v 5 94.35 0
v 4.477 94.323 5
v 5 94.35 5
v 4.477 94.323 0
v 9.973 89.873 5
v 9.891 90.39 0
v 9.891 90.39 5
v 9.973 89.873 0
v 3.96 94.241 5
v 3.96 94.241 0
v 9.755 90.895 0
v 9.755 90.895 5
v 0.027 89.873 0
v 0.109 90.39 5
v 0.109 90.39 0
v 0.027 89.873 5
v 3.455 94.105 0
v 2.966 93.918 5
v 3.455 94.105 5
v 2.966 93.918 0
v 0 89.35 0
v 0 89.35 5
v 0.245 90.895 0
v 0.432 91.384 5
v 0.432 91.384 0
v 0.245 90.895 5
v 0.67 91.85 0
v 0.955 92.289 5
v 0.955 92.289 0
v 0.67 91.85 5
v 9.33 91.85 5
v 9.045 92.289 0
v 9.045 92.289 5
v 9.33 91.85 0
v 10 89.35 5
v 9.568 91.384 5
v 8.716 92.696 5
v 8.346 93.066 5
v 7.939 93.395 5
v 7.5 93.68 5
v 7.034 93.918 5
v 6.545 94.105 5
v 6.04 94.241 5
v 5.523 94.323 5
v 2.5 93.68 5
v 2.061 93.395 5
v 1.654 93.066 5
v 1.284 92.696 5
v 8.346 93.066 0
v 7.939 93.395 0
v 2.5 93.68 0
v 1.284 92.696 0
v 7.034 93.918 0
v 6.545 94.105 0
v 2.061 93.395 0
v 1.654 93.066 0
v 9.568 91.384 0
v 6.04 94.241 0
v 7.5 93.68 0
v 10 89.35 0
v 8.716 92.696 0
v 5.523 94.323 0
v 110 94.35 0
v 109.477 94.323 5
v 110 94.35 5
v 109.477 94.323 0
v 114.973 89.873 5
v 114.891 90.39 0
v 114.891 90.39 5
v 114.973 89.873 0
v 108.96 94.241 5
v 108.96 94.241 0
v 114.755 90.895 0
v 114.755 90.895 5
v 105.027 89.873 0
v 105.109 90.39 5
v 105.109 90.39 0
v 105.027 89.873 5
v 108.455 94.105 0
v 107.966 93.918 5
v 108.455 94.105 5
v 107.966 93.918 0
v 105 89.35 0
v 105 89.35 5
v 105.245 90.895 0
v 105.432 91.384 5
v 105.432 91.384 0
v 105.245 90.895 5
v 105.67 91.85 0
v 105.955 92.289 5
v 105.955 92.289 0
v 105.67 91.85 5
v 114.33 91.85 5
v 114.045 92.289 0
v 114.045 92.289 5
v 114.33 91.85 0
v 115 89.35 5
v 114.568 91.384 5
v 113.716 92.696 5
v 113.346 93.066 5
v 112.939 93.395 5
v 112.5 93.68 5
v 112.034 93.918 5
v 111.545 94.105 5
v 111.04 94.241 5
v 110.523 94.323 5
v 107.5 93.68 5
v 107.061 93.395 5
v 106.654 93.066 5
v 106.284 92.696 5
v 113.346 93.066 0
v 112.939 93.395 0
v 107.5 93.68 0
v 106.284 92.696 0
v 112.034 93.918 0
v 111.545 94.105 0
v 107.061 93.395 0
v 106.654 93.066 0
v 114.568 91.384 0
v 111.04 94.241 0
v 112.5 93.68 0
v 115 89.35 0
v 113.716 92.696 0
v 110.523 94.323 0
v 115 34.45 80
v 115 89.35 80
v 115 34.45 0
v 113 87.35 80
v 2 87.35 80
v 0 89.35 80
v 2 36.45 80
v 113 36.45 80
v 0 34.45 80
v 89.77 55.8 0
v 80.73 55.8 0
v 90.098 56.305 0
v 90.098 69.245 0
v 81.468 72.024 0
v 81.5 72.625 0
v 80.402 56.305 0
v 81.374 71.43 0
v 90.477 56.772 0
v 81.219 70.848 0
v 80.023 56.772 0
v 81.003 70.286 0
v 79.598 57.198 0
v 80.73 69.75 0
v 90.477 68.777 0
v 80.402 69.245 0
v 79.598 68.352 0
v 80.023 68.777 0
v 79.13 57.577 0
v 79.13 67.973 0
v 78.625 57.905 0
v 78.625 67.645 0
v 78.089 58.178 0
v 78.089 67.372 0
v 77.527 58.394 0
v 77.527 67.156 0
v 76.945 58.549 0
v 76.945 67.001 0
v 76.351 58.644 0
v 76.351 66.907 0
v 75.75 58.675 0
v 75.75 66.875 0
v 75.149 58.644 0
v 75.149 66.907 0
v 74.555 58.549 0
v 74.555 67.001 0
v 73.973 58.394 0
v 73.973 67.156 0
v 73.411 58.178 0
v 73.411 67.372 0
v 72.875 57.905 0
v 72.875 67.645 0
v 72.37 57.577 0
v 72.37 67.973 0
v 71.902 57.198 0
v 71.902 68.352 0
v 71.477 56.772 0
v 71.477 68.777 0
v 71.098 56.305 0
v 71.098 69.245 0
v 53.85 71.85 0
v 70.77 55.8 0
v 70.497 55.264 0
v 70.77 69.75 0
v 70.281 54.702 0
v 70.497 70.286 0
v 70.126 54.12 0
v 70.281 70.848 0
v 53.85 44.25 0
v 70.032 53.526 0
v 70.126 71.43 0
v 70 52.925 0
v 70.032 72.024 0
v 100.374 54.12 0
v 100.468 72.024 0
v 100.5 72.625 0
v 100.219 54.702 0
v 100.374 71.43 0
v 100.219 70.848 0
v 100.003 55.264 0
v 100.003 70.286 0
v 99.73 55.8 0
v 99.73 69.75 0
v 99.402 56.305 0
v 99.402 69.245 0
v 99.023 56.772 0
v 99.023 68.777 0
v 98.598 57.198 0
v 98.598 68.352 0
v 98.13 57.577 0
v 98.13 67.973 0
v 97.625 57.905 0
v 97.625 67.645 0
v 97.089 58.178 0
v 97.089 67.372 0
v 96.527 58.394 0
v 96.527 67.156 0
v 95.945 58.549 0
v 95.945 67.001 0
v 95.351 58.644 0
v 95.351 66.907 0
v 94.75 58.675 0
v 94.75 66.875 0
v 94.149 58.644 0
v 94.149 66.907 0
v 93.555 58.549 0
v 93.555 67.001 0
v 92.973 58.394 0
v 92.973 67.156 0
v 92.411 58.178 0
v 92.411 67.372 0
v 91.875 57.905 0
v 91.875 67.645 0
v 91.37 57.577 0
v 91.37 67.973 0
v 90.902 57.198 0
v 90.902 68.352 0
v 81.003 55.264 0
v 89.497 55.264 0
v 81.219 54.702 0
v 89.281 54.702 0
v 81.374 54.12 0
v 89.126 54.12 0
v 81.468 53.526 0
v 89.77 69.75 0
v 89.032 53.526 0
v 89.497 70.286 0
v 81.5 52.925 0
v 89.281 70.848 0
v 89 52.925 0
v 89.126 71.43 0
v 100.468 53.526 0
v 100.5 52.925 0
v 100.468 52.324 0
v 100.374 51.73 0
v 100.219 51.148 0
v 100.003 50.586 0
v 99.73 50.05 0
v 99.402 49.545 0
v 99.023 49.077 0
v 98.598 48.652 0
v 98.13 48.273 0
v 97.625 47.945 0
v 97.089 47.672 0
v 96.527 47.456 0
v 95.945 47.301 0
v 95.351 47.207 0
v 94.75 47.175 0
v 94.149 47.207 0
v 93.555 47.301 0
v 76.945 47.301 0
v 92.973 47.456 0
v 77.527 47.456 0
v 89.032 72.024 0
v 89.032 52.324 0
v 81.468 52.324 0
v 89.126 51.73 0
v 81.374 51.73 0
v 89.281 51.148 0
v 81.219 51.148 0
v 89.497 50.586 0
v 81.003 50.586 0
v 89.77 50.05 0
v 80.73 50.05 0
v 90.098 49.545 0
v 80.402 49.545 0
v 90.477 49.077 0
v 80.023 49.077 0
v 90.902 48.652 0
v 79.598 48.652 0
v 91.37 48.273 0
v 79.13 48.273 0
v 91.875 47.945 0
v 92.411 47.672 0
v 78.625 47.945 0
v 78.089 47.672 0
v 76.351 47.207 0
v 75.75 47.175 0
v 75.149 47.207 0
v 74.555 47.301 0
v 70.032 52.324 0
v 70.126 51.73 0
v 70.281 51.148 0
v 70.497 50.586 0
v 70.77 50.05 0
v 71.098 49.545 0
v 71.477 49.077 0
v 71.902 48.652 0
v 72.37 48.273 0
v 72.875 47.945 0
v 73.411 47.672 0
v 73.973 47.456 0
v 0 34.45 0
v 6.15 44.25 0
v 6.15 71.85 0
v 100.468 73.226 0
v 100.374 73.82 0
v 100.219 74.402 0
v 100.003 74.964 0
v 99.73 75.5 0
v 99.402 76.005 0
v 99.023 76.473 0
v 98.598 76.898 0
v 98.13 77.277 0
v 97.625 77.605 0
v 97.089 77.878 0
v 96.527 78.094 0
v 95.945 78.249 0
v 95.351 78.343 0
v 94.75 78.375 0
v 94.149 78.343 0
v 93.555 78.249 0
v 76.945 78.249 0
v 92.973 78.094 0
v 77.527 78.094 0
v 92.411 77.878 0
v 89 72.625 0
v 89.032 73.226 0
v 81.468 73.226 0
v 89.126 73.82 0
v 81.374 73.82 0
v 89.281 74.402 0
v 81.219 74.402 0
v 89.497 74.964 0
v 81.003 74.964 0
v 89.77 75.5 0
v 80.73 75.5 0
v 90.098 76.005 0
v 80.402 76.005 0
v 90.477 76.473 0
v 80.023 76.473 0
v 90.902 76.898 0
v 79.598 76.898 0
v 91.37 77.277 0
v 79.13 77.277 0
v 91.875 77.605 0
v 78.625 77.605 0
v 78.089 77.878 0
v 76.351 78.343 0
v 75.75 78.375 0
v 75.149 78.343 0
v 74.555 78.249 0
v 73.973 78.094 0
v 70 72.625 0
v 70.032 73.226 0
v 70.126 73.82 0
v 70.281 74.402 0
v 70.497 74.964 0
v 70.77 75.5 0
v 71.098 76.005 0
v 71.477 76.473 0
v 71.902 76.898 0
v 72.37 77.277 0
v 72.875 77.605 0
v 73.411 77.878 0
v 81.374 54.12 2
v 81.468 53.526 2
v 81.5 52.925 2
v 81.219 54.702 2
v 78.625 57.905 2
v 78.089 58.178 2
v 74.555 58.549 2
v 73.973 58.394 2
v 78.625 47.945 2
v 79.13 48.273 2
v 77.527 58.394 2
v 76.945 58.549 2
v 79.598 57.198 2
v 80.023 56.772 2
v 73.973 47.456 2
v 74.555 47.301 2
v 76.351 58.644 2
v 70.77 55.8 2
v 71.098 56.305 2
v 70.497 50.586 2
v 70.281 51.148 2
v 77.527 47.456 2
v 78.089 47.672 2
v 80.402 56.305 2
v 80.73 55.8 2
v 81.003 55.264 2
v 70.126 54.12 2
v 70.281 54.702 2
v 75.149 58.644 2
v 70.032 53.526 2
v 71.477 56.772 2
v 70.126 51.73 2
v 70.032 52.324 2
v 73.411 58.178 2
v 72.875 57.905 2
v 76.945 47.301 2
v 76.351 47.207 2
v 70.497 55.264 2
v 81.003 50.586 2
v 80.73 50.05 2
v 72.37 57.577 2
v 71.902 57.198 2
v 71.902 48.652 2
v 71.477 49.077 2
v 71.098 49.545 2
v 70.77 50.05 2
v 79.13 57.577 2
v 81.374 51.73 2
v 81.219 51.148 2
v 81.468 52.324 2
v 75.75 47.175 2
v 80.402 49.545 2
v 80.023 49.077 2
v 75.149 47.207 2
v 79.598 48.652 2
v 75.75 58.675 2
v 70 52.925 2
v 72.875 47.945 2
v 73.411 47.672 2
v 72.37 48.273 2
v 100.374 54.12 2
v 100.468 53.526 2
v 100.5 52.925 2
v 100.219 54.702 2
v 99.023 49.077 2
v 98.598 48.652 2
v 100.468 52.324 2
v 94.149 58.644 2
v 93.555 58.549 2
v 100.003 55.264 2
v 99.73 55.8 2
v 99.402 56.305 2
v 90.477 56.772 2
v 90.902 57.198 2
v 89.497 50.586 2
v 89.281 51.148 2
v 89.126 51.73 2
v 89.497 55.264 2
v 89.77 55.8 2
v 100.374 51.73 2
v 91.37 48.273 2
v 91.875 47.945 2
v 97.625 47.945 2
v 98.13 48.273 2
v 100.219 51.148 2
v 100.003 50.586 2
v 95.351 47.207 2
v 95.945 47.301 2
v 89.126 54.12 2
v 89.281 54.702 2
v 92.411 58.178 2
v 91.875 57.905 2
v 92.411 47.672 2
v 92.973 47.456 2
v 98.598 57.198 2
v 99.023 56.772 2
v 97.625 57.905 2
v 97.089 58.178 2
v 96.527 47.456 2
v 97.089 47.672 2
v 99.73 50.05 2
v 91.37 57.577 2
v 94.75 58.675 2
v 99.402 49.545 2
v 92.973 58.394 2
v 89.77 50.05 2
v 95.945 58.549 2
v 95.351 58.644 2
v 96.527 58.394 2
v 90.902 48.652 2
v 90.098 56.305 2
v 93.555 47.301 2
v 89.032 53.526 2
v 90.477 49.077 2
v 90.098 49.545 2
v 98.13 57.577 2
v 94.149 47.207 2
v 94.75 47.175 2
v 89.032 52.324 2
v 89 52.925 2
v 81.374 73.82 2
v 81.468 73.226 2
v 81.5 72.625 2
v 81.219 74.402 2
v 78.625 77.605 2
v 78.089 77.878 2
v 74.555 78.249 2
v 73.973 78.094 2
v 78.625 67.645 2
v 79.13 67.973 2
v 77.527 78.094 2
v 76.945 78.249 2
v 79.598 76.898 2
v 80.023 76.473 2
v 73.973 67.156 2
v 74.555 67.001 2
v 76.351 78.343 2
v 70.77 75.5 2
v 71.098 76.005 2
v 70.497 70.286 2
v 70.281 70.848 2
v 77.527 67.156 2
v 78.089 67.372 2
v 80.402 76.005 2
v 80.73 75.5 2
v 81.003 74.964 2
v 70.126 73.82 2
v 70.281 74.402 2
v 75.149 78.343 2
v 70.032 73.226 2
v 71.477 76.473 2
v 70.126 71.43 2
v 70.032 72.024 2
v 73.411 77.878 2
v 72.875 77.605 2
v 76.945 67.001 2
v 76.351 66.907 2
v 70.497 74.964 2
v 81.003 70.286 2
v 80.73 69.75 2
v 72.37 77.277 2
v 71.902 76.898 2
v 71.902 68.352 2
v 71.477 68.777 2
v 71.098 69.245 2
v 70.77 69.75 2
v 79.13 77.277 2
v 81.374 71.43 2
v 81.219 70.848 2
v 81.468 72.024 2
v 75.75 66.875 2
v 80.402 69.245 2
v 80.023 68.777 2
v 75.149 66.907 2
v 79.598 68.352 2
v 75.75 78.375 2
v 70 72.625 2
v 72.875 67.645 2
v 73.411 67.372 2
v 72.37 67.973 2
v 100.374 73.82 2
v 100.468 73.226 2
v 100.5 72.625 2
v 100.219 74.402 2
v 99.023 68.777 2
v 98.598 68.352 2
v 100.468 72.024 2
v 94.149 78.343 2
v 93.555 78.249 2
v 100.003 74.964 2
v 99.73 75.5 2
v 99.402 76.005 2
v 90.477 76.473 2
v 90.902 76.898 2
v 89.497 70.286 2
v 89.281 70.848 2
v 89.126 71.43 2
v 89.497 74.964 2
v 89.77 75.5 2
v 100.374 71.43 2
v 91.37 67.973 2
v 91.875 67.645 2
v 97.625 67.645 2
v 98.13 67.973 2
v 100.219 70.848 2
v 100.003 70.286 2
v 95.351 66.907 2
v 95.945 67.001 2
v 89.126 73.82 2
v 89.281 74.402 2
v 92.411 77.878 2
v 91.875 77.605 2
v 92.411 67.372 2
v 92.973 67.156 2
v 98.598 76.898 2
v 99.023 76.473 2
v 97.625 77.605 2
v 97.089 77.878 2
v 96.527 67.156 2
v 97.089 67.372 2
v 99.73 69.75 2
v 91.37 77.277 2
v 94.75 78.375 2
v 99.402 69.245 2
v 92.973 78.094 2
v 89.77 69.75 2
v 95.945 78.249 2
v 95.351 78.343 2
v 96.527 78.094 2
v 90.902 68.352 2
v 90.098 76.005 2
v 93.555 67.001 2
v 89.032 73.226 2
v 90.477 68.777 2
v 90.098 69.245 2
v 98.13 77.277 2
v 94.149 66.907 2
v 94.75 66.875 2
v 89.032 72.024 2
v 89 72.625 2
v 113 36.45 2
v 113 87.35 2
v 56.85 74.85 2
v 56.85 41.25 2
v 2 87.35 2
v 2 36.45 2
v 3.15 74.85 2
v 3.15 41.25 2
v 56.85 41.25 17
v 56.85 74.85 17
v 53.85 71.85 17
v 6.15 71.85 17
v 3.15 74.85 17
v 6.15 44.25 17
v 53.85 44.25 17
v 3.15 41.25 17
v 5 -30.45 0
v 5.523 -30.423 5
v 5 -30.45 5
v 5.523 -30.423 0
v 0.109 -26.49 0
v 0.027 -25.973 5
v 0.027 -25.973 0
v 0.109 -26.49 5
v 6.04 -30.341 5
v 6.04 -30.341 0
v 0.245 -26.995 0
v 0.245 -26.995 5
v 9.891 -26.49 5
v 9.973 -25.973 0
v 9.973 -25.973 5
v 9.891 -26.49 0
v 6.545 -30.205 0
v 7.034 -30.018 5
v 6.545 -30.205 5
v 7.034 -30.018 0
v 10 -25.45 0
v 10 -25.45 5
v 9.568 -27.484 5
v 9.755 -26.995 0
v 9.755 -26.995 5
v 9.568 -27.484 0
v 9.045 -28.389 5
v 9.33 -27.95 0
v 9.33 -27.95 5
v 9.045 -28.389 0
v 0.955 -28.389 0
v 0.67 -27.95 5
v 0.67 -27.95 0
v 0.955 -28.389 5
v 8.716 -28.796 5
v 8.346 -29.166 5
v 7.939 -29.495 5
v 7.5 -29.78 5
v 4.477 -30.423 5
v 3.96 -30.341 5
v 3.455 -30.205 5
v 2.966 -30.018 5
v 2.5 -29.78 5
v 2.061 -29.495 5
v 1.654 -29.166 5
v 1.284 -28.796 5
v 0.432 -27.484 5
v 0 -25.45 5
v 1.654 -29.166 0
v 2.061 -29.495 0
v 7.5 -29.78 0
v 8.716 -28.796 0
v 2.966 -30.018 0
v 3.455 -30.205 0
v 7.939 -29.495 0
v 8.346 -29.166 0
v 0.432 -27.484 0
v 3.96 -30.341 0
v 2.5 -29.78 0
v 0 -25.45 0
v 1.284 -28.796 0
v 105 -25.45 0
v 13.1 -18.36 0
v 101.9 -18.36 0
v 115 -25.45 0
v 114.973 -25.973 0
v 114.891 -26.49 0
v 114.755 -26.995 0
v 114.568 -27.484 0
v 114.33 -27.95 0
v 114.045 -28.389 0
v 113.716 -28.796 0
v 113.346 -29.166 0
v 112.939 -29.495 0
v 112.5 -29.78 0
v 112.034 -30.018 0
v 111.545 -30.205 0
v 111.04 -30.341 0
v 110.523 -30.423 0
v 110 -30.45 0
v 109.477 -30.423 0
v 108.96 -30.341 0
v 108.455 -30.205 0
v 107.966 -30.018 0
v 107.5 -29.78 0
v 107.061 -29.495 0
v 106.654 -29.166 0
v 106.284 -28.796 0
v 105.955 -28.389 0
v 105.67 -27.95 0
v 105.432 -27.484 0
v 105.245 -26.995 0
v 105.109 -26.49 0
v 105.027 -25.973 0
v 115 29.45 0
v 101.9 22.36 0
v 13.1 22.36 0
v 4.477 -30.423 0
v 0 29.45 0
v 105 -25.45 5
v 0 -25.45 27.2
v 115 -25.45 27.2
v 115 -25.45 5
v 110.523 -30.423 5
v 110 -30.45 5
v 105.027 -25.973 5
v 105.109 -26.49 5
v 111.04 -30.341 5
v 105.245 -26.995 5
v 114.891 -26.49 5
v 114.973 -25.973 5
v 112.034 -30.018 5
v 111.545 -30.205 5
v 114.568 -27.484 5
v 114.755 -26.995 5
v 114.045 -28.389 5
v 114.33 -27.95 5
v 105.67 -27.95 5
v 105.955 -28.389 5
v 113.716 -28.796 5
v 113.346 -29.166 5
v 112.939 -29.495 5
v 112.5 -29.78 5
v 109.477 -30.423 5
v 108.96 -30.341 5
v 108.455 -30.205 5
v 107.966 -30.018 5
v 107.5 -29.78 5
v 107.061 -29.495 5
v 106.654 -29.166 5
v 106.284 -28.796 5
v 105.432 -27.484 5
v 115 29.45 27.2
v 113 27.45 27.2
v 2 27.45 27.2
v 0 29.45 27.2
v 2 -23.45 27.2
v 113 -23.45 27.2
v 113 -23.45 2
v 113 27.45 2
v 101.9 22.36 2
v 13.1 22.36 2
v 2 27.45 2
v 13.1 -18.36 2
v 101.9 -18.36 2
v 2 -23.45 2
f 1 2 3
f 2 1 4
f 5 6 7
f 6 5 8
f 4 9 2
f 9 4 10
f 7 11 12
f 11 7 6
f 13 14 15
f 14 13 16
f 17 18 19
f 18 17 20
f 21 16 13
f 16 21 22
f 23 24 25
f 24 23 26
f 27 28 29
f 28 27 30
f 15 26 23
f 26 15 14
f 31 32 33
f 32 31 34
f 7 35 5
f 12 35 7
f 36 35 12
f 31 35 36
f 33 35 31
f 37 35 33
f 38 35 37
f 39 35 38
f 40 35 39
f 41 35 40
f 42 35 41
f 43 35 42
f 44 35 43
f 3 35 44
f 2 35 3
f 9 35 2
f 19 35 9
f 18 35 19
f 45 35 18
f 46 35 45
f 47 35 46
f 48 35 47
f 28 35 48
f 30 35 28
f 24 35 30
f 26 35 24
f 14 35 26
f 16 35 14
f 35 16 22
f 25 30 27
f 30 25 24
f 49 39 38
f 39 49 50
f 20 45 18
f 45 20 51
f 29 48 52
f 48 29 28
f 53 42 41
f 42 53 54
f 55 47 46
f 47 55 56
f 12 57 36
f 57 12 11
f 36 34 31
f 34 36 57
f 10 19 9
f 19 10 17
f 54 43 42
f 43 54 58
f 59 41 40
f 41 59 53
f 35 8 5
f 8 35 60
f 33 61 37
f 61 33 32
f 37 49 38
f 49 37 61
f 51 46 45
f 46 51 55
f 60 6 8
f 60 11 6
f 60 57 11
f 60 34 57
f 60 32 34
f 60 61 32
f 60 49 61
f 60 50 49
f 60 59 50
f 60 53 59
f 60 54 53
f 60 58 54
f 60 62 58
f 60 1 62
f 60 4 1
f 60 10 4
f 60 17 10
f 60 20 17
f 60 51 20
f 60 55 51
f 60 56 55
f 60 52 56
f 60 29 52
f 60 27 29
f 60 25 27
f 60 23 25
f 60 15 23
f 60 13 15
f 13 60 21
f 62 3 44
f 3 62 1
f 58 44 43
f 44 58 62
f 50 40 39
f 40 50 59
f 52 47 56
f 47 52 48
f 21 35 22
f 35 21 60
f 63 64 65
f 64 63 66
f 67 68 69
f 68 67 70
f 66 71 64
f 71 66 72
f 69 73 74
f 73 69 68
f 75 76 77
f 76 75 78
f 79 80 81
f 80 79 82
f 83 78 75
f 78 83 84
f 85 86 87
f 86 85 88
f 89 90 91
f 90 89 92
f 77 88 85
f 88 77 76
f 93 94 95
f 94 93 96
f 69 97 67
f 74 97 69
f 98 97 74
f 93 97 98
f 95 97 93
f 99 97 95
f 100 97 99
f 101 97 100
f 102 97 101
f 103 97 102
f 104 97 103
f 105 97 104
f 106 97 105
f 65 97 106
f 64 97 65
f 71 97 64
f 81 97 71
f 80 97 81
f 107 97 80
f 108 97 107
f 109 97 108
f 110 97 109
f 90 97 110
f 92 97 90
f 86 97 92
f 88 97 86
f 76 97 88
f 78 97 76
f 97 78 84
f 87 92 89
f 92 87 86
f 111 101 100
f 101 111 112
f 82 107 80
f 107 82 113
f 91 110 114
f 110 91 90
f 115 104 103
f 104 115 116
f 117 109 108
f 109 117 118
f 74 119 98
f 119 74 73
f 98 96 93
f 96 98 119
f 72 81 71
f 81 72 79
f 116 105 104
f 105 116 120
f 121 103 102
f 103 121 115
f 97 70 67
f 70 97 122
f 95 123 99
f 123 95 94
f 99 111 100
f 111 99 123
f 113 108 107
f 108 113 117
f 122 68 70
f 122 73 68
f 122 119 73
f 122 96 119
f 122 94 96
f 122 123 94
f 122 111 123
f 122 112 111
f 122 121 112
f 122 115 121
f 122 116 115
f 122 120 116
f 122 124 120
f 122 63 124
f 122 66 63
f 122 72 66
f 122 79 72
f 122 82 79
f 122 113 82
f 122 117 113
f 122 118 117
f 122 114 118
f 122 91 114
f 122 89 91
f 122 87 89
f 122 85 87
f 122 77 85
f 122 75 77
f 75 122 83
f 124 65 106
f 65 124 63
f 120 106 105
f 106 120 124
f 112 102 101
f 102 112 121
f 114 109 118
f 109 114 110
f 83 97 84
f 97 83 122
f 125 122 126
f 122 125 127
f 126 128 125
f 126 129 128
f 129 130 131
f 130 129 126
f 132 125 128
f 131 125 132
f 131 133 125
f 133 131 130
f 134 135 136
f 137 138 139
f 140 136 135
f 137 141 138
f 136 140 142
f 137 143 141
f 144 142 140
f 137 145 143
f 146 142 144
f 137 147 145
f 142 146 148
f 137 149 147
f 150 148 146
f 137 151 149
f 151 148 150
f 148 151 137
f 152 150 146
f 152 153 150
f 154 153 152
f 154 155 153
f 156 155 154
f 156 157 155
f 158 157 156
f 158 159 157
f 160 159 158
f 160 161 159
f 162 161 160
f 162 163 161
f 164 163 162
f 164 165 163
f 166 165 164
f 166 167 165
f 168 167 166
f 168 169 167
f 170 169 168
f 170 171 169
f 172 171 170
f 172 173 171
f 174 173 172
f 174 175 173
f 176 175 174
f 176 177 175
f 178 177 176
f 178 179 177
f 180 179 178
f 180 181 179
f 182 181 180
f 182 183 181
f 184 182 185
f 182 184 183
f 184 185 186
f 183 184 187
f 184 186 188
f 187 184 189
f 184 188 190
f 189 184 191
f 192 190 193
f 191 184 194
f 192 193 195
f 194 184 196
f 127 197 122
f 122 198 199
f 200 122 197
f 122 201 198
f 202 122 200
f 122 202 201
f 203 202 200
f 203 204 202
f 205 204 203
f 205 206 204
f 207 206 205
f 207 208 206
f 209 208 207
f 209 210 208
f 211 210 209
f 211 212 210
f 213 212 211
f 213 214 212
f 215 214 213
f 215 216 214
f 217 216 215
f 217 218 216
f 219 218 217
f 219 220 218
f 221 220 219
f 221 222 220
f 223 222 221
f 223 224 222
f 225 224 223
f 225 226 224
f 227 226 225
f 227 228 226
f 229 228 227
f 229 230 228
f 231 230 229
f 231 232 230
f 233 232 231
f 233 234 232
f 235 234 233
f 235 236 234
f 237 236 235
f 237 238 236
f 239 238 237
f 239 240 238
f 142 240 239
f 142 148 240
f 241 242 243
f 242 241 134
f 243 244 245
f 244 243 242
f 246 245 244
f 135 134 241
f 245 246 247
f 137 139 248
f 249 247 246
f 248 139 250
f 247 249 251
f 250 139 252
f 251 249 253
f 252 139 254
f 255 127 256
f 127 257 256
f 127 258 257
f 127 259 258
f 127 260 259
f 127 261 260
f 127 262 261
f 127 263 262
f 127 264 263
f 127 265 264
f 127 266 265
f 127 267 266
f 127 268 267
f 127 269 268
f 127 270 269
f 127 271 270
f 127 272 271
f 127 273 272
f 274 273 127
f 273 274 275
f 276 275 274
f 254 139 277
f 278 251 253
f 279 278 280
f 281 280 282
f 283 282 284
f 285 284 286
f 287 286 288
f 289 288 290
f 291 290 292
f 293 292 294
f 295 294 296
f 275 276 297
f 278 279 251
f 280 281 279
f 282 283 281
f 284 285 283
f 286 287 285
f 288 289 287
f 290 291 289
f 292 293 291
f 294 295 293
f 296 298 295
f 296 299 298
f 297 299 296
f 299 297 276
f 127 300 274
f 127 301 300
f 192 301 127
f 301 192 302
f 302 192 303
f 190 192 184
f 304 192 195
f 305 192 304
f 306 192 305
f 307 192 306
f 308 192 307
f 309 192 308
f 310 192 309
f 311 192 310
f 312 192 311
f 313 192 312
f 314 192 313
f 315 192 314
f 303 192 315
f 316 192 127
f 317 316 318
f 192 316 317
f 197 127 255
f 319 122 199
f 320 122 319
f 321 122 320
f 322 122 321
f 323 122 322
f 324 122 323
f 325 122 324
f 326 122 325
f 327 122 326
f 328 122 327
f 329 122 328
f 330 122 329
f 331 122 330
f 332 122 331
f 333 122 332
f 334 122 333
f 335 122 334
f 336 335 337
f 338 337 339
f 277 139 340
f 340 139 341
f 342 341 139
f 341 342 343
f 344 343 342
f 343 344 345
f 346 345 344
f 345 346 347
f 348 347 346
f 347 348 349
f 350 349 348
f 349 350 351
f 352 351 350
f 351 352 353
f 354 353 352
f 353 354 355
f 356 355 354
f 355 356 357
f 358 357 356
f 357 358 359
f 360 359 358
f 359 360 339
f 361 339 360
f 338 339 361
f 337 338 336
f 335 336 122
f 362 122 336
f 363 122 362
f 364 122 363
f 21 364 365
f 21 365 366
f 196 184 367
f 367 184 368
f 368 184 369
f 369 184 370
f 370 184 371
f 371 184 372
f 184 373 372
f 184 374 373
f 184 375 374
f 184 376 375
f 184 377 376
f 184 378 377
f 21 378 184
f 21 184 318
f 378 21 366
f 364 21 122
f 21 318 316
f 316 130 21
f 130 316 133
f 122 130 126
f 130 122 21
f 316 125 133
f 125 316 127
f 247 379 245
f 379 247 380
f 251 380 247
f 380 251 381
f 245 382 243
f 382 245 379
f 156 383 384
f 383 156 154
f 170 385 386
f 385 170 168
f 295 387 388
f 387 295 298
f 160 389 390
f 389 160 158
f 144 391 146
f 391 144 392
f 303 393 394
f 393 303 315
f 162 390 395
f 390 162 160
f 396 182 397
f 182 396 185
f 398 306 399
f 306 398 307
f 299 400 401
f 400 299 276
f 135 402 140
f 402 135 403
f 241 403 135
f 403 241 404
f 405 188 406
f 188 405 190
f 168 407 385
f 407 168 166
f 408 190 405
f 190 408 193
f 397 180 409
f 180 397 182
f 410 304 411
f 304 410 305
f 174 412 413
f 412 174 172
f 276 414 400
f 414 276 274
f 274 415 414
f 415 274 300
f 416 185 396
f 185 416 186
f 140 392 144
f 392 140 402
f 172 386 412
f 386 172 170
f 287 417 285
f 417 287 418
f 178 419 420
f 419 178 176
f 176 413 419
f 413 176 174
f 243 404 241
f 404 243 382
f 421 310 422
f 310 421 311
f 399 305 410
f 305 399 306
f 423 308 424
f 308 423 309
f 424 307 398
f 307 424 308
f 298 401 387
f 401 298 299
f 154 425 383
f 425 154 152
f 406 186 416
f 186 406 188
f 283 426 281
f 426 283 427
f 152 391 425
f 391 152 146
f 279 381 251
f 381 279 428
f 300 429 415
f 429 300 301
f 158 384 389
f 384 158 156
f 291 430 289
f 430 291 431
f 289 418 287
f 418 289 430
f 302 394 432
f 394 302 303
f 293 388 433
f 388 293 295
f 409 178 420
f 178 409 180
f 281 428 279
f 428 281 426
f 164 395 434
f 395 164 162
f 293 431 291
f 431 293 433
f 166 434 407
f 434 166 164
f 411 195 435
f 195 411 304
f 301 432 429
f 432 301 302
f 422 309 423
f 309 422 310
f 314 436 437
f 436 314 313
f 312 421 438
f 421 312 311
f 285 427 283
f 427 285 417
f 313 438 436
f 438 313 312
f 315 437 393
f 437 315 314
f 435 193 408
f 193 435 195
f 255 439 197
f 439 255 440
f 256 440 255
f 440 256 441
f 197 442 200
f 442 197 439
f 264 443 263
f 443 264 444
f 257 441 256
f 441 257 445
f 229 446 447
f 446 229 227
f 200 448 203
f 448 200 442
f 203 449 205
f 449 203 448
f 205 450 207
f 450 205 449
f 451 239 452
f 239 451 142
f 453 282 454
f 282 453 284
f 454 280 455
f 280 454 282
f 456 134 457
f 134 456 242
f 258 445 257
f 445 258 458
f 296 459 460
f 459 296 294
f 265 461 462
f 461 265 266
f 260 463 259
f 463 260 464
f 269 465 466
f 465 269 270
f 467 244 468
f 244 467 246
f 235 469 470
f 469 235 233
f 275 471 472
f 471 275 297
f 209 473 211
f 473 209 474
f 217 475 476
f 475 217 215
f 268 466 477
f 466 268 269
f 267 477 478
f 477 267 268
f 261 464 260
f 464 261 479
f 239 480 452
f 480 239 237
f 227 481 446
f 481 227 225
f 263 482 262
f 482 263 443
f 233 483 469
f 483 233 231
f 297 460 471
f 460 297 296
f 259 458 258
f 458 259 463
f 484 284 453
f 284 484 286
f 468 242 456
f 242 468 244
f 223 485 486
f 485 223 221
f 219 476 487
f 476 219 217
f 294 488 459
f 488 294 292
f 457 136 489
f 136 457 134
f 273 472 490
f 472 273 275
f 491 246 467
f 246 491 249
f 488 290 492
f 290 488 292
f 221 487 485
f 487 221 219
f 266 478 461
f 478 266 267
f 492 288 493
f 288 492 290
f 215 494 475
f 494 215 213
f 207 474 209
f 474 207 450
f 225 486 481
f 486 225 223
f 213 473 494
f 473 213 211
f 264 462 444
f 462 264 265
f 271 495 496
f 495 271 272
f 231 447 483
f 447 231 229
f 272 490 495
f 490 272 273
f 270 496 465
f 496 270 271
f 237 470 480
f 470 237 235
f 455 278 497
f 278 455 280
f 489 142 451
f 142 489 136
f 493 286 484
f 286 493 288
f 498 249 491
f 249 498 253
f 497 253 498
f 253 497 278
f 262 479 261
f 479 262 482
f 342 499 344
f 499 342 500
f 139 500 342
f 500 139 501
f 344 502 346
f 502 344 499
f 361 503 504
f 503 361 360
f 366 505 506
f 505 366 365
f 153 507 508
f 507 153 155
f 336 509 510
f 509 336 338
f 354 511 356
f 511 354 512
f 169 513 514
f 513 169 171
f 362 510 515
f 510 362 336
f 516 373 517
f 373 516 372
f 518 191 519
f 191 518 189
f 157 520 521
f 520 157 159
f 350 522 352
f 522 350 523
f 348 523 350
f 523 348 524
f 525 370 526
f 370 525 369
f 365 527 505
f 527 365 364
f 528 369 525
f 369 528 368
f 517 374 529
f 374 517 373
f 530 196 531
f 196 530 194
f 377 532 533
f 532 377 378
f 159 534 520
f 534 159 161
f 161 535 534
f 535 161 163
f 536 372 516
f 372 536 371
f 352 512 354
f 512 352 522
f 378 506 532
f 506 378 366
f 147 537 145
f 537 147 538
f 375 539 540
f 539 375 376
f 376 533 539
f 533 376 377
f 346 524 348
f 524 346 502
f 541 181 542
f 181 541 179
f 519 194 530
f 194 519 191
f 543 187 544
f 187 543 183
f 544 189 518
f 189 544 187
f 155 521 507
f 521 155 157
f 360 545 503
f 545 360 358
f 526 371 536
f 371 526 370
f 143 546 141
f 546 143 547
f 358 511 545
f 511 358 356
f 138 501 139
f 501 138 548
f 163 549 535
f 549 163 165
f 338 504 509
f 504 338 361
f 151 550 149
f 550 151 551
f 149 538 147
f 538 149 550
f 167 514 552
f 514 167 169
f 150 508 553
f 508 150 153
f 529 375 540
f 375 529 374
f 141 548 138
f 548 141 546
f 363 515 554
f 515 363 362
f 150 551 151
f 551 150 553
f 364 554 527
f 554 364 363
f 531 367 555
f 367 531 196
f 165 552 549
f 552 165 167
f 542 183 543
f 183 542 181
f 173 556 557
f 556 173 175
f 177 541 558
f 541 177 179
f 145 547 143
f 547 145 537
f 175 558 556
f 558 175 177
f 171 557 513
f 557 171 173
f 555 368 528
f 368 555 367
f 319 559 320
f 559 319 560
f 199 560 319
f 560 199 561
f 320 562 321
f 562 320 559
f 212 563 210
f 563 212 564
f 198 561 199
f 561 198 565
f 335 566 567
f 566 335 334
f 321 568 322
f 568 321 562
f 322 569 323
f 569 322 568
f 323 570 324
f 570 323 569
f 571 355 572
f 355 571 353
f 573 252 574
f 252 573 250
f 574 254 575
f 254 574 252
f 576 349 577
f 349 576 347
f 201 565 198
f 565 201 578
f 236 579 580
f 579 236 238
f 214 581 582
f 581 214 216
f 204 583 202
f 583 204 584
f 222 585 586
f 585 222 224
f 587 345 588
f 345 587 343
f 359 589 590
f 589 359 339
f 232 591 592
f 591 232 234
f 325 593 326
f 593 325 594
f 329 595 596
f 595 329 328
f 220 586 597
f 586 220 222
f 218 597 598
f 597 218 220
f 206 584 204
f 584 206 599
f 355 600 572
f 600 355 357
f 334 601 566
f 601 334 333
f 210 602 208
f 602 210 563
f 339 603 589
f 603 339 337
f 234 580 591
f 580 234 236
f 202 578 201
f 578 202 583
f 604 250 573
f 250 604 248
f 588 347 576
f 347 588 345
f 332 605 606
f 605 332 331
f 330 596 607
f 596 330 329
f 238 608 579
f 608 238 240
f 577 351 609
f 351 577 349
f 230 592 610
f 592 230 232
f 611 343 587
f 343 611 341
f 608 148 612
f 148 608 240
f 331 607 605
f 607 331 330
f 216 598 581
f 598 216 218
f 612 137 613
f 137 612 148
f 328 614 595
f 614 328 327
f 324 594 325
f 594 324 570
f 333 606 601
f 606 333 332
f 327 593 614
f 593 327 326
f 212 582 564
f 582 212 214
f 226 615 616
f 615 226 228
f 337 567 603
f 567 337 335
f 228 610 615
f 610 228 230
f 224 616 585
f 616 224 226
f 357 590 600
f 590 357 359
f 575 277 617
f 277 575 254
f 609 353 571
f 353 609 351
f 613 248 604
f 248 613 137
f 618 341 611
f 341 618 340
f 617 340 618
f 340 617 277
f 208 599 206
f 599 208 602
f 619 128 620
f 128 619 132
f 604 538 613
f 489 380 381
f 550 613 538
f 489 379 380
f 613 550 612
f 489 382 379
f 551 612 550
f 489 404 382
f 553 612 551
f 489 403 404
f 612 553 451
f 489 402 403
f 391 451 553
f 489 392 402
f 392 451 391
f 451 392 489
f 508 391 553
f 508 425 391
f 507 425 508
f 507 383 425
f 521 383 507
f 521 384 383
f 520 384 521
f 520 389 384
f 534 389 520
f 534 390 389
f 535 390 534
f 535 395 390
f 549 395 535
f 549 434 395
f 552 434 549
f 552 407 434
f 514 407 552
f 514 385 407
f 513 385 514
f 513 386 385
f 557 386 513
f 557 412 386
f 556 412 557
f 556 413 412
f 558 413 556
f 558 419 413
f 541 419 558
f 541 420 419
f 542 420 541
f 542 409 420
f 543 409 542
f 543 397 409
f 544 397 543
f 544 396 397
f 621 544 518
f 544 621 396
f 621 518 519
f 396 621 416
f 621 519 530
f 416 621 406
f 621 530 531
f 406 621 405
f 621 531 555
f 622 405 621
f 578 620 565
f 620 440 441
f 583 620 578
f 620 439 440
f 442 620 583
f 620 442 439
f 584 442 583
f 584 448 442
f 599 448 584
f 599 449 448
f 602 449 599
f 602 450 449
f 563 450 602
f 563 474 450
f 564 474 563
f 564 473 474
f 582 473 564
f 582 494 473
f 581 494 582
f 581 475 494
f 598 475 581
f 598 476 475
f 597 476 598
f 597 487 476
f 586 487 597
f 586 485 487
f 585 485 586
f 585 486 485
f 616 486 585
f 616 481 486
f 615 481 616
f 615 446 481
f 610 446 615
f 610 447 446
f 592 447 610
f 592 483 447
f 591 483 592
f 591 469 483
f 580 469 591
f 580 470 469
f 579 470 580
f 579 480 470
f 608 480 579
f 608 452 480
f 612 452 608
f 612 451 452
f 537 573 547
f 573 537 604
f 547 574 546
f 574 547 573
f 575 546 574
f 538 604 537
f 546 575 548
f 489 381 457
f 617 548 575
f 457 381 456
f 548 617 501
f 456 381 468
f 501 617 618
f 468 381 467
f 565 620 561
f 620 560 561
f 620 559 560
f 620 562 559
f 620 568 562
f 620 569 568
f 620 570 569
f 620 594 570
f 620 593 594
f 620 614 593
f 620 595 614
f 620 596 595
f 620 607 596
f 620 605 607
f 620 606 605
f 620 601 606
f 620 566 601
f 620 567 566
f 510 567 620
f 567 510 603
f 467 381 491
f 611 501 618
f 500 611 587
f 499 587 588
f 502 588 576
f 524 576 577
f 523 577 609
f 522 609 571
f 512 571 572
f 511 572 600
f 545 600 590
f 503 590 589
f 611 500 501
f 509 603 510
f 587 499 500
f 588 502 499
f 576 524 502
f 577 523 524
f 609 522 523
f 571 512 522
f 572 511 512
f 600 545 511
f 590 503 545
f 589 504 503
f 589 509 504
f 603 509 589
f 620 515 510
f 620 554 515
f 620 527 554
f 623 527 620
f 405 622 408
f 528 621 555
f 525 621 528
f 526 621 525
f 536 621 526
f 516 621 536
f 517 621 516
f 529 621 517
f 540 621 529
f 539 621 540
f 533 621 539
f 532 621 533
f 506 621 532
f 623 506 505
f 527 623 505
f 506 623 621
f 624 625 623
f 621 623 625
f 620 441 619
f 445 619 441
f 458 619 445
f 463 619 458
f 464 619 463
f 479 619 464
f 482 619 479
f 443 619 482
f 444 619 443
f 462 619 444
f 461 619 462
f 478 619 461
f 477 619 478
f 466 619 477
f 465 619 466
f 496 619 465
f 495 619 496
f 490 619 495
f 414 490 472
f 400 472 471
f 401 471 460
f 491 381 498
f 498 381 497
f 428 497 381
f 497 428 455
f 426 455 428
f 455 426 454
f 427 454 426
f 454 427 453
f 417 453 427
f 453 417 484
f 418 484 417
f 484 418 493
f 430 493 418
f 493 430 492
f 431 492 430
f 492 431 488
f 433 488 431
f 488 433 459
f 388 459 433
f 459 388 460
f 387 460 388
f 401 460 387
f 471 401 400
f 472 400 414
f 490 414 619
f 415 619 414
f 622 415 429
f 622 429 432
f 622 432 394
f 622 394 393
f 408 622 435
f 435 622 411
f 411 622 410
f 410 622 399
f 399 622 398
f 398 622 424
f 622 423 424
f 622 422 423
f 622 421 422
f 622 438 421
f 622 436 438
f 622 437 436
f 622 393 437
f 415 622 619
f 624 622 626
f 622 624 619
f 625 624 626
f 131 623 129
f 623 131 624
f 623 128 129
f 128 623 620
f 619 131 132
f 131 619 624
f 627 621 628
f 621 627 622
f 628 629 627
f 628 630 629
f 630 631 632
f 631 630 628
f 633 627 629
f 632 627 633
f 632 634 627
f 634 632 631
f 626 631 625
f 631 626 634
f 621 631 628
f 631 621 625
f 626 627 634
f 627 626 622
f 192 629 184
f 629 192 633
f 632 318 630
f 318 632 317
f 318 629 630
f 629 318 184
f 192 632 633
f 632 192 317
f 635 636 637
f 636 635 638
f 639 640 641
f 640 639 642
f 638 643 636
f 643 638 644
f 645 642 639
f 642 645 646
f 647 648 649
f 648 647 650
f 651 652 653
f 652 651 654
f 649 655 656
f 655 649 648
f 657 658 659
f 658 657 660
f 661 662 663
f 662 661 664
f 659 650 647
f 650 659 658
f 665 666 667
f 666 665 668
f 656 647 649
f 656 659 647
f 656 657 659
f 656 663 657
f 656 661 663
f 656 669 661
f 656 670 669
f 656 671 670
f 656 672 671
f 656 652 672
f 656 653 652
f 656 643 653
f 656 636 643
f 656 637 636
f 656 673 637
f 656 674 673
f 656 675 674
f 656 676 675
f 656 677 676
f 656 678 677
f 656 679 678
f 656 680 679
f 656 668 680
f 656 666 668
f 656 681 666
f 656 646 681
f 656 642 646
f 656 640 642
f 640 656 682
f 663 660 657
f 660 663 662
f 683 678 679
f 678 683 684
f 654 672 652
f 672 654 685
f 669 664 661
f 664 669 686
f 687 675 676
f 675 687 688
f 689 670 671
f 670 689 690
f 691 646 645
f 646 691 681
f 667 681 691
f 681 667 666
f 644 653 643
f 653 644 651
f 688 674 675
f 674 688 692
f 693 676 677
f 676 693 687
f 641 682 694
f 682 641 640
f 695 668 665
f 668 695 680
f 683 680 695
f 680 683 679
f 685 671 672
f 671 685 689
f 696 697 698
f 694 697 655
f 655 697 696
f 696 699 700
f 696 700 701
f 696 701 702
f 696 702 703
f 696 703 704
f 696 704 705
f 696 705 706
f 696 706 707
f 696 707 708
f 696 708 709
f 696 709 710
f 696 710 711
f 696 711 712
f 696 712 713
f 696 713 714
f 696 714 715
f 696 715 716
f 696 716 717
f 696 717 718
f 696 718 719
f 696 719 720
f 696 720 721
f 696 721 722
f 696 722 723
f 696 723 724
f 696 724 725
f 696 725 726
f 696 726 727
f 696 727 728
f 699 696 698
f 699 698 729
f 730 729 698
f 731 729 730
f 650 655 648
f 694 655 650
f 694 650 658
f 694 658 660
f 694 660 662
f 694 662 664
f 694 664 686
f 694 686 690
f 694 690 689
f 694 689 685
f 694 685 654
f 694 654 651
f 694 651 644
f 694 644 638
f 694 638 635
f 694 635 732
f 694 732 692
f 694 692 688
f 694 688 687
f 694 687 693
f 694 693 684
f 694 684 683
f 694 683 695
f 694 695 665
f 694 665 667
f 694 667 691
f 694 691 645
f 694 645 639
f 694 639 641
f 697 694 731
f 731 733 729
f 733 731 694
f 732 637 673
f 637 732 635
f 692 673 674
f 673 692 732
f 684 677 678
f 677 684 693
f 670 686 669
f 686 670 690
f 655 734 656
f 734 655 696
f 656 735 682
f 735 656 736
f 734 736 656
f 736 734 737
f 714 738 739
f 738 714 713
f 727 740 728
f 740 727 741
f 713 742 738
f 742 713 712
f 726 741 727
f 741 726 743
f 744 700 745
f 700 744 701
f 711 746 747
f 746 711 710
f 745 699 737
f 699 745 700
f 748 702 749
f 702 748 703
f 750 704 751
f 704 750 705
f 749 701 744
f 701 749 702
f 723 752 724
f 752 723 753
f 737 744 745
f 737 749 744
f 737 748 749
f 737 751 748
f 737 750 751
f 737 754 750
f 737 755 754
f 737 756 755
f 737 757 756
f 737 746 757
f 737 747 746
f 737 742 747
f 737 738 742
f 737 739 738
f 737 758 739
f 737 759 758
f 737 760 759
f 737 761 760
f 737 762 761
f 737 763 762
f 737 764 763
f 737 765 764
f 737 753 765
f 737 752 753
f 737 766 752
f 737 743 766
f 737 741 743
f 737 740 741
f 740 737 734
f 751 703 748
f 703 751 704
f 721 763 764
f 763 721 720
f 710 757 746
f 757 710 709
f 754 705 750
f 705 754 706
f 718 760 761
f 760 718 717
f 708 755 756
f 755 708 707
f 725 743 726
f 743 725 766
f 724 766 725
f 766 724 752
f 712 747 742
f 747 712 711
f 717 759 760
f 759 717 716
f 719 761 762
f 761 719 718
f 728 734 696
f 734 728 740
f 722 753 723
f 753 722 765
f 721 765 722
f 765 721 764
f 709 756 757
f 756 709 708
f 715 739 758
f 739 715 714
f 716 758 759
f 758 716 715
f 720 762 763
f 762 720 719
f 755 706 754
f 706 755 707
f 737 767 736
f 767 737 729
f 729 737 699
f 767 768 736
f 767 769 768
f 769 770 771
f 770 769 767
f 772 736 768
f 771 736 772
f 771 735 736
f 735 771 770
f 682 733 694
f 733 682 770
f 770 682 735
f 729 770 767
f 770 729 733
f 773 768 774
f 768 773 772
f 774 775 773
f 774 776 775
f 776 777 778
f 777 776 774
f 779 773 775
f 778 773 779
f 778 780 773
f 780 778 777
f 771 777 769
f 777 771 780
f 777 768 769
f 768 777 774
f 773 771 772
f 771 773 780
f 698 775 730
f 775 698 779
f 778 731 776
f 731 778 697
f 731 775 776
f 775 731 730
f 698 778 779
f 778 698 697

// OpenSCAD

/* Open SCAD Name.: 
*  Copyright (c)..: 2016 www.DIY3DTech.com
*
*  Creation Date..:
*  Description....: PSU end covers
*
*  Rev 1: Base design: drcharlesbell@gmail.com
*  Rev 2: Modifcations by http://www.DIY3DTech.com
*
*  This program is free software; you can redistribute it and/or modify
*  it under the terms of the GNU General Public License as published by
*  the Free Software Foundation; either version 2 of the License, or
*  (at your option) any later version.
*
*  This program is distributed in the hope that it will be useful,
*  but WITHOUT ANY WARRANTY; without even the implied warranty of
*  MERCHANTABILITY or FITNESS FOR A PARTICULAR PURPOSE.  See the
*  GNU General Public License for more details.
*/

// Parts:
// Inlet Male Power Socket with Fuse Switch 10A 250V 3 Pin IEC320 C14
// http://amzn.to/2aMR5ve
//
// 10pcs Terminal Binding Post Power Amplifier Dual 2-way Banana Plug Jack
// http://amzn.to/2biVSaq

/*------------------Customizer View-------------------*/

// preview[view:north, tilt:top]

/*---------------------Parameters---------------------*/

// height of the PSU (add for plastic expansion)
height = 50.9;
// width of the PSU (add for plastic expansion)
width = 111;  
// depth for power-side cover (leave room for switch)
power_side_depth = 80;  //[1:1:100]
// depth for blank-side cover
blank_side_depth = 27.2;  //[1:1:100]
// length of power block
PWR_Block_len = 47.7;   
// height of power block
PWR_Block_height = 27.6;
// 0 = Round Opening 1 = Single Banna Jack 2 = Double Banna Jack
DC_Type = 2; //[0:Single Hole, 1:One Banna Jack Pair, 2:Two Banna Jack Pair]
// Outlet hole for DC power cord DC_Type = 0
DC_power_diameter = 8.0; //[1:1:10]


/*-----------------------Execute----------------------*/

translate ([0,(height/2)+9,0]) power_side();
translate ([0,-(height/2),0]) blank_side();


/*-----------------------Modules----------------------*/


module power_side() {
    
    difference() { //first order differance to add power block support
      
        union() {//start first union
        //create main unit
            difference() {
                union() {//start union second union
                    cube([width+4,height+4,power_side_depth]); 
        
                    //create feet
                    translate([5,(height-1)+5,0]) rotate([0,0,180]) foot();
                    translate([width-1,(height-1)+5,0]) rotate([0,0,180]) foot(); 

                        } //end second union  
             
            //start subtraction of difference
            translate([2,2,2]) cube([width,height,power_side_depth]);
                        
            // start if tree      
                if(DC_Type==0) translate([((((width/2)/2)-(19/2)+11.5))+(width/2),(height/2),-1]) rotate([0,0,0])  cylinder(6,DC_power_diameter/2,DC_power_diameter/2);
                else if(DC_Type==1)   translate([((((width/2)/2)-(19/2)+11.5))+(width/2),(height/2),-1]) rotate([0,0,0]) dual_banna_jack();
                else if(DC_Type==2)    {translate([((((width/2)/2)-(19/2)+11.5))+(width/2),((height/4)+(11.5/2)),-1]) rotate([0,0,0]) dual_banna_jack(); translate([((((width/2)/2)-(19/2)+11.5))+(width/2),(height/2)+(height/4),-1]) rotate([0,0,0]) dual_banna_jack();}
            // end if tree  

        } //end second difference 
            //create inter-support for power block to keep from moving
            translate([(30-((PWR_Block_len+6)/2)),((PWR_Block_height-6)/2)-4,0]) cube([PWR_Block_len+6,PWR_Block_height+6,17]);

  } //end first union 
       // power block cutout from support as well as primary box
        translate([(30-(PWR_Block_len/2)),(PWR_Block_height/2)-4,-1]) cube([PWR_Block_len,PWR_Block_height,22]); 
  
  } //end first difference 
}//end module power_side

module blank_side() {
  difference() {
      
        union() {//start union
            cube([width+4,height+4,blank_side_depth]);
             //create feet
            translate([5,0,0]) rotate([0,0,0]) foot();
            translate([width-1,0,0]) rotate([0,0,0]) foot();   
             } //end union 
             
    //start subtraction of difference
    //create center opening         
    translate([2,2,2]) cube([width,height,blank_side_depth]);
    //remove extra plastic from cover by making a hole 80% of the opening›         
    translate([(((width+4)/2)-((width*0.8)/2)),((height+4)/2)-((height*0.8)/2),-1]) cube([(width*0.8),(height*0.8),blank_side_depth]);
    
  }//end difference
}//end blank_side module

module foot() {
    //create tabed foot
    difference() {
            union() {//start union
                  translate([0,0,0]) rotate([0,0,0]) cylinder(5,10/2,10/2,$fn=60);
                    } //end union
    //start subtraction of difference
                  translate([-5,0,-2.5]) rotate([0,0,0]) cube([10,10,10]);
    } //end difference
}//end foot

module dual_banna_jack() {
    //create tabed foot
    difference() {
            union() {//start union
                  translate([-9.5,0,0]) rotate([0,0,0]) cylinder(10,11.5/2,11.5/2,$fn=60);
                  translate([9.5,0,0]) rotate([0,0,0]) cylinder(10,11.5/2,11.5/2,$fn=60);
                    } //end union
    //start any subtraction of difference below if needed
                 
    }//end difference
}//end foot
/*----------------------End Code----------------------*/
